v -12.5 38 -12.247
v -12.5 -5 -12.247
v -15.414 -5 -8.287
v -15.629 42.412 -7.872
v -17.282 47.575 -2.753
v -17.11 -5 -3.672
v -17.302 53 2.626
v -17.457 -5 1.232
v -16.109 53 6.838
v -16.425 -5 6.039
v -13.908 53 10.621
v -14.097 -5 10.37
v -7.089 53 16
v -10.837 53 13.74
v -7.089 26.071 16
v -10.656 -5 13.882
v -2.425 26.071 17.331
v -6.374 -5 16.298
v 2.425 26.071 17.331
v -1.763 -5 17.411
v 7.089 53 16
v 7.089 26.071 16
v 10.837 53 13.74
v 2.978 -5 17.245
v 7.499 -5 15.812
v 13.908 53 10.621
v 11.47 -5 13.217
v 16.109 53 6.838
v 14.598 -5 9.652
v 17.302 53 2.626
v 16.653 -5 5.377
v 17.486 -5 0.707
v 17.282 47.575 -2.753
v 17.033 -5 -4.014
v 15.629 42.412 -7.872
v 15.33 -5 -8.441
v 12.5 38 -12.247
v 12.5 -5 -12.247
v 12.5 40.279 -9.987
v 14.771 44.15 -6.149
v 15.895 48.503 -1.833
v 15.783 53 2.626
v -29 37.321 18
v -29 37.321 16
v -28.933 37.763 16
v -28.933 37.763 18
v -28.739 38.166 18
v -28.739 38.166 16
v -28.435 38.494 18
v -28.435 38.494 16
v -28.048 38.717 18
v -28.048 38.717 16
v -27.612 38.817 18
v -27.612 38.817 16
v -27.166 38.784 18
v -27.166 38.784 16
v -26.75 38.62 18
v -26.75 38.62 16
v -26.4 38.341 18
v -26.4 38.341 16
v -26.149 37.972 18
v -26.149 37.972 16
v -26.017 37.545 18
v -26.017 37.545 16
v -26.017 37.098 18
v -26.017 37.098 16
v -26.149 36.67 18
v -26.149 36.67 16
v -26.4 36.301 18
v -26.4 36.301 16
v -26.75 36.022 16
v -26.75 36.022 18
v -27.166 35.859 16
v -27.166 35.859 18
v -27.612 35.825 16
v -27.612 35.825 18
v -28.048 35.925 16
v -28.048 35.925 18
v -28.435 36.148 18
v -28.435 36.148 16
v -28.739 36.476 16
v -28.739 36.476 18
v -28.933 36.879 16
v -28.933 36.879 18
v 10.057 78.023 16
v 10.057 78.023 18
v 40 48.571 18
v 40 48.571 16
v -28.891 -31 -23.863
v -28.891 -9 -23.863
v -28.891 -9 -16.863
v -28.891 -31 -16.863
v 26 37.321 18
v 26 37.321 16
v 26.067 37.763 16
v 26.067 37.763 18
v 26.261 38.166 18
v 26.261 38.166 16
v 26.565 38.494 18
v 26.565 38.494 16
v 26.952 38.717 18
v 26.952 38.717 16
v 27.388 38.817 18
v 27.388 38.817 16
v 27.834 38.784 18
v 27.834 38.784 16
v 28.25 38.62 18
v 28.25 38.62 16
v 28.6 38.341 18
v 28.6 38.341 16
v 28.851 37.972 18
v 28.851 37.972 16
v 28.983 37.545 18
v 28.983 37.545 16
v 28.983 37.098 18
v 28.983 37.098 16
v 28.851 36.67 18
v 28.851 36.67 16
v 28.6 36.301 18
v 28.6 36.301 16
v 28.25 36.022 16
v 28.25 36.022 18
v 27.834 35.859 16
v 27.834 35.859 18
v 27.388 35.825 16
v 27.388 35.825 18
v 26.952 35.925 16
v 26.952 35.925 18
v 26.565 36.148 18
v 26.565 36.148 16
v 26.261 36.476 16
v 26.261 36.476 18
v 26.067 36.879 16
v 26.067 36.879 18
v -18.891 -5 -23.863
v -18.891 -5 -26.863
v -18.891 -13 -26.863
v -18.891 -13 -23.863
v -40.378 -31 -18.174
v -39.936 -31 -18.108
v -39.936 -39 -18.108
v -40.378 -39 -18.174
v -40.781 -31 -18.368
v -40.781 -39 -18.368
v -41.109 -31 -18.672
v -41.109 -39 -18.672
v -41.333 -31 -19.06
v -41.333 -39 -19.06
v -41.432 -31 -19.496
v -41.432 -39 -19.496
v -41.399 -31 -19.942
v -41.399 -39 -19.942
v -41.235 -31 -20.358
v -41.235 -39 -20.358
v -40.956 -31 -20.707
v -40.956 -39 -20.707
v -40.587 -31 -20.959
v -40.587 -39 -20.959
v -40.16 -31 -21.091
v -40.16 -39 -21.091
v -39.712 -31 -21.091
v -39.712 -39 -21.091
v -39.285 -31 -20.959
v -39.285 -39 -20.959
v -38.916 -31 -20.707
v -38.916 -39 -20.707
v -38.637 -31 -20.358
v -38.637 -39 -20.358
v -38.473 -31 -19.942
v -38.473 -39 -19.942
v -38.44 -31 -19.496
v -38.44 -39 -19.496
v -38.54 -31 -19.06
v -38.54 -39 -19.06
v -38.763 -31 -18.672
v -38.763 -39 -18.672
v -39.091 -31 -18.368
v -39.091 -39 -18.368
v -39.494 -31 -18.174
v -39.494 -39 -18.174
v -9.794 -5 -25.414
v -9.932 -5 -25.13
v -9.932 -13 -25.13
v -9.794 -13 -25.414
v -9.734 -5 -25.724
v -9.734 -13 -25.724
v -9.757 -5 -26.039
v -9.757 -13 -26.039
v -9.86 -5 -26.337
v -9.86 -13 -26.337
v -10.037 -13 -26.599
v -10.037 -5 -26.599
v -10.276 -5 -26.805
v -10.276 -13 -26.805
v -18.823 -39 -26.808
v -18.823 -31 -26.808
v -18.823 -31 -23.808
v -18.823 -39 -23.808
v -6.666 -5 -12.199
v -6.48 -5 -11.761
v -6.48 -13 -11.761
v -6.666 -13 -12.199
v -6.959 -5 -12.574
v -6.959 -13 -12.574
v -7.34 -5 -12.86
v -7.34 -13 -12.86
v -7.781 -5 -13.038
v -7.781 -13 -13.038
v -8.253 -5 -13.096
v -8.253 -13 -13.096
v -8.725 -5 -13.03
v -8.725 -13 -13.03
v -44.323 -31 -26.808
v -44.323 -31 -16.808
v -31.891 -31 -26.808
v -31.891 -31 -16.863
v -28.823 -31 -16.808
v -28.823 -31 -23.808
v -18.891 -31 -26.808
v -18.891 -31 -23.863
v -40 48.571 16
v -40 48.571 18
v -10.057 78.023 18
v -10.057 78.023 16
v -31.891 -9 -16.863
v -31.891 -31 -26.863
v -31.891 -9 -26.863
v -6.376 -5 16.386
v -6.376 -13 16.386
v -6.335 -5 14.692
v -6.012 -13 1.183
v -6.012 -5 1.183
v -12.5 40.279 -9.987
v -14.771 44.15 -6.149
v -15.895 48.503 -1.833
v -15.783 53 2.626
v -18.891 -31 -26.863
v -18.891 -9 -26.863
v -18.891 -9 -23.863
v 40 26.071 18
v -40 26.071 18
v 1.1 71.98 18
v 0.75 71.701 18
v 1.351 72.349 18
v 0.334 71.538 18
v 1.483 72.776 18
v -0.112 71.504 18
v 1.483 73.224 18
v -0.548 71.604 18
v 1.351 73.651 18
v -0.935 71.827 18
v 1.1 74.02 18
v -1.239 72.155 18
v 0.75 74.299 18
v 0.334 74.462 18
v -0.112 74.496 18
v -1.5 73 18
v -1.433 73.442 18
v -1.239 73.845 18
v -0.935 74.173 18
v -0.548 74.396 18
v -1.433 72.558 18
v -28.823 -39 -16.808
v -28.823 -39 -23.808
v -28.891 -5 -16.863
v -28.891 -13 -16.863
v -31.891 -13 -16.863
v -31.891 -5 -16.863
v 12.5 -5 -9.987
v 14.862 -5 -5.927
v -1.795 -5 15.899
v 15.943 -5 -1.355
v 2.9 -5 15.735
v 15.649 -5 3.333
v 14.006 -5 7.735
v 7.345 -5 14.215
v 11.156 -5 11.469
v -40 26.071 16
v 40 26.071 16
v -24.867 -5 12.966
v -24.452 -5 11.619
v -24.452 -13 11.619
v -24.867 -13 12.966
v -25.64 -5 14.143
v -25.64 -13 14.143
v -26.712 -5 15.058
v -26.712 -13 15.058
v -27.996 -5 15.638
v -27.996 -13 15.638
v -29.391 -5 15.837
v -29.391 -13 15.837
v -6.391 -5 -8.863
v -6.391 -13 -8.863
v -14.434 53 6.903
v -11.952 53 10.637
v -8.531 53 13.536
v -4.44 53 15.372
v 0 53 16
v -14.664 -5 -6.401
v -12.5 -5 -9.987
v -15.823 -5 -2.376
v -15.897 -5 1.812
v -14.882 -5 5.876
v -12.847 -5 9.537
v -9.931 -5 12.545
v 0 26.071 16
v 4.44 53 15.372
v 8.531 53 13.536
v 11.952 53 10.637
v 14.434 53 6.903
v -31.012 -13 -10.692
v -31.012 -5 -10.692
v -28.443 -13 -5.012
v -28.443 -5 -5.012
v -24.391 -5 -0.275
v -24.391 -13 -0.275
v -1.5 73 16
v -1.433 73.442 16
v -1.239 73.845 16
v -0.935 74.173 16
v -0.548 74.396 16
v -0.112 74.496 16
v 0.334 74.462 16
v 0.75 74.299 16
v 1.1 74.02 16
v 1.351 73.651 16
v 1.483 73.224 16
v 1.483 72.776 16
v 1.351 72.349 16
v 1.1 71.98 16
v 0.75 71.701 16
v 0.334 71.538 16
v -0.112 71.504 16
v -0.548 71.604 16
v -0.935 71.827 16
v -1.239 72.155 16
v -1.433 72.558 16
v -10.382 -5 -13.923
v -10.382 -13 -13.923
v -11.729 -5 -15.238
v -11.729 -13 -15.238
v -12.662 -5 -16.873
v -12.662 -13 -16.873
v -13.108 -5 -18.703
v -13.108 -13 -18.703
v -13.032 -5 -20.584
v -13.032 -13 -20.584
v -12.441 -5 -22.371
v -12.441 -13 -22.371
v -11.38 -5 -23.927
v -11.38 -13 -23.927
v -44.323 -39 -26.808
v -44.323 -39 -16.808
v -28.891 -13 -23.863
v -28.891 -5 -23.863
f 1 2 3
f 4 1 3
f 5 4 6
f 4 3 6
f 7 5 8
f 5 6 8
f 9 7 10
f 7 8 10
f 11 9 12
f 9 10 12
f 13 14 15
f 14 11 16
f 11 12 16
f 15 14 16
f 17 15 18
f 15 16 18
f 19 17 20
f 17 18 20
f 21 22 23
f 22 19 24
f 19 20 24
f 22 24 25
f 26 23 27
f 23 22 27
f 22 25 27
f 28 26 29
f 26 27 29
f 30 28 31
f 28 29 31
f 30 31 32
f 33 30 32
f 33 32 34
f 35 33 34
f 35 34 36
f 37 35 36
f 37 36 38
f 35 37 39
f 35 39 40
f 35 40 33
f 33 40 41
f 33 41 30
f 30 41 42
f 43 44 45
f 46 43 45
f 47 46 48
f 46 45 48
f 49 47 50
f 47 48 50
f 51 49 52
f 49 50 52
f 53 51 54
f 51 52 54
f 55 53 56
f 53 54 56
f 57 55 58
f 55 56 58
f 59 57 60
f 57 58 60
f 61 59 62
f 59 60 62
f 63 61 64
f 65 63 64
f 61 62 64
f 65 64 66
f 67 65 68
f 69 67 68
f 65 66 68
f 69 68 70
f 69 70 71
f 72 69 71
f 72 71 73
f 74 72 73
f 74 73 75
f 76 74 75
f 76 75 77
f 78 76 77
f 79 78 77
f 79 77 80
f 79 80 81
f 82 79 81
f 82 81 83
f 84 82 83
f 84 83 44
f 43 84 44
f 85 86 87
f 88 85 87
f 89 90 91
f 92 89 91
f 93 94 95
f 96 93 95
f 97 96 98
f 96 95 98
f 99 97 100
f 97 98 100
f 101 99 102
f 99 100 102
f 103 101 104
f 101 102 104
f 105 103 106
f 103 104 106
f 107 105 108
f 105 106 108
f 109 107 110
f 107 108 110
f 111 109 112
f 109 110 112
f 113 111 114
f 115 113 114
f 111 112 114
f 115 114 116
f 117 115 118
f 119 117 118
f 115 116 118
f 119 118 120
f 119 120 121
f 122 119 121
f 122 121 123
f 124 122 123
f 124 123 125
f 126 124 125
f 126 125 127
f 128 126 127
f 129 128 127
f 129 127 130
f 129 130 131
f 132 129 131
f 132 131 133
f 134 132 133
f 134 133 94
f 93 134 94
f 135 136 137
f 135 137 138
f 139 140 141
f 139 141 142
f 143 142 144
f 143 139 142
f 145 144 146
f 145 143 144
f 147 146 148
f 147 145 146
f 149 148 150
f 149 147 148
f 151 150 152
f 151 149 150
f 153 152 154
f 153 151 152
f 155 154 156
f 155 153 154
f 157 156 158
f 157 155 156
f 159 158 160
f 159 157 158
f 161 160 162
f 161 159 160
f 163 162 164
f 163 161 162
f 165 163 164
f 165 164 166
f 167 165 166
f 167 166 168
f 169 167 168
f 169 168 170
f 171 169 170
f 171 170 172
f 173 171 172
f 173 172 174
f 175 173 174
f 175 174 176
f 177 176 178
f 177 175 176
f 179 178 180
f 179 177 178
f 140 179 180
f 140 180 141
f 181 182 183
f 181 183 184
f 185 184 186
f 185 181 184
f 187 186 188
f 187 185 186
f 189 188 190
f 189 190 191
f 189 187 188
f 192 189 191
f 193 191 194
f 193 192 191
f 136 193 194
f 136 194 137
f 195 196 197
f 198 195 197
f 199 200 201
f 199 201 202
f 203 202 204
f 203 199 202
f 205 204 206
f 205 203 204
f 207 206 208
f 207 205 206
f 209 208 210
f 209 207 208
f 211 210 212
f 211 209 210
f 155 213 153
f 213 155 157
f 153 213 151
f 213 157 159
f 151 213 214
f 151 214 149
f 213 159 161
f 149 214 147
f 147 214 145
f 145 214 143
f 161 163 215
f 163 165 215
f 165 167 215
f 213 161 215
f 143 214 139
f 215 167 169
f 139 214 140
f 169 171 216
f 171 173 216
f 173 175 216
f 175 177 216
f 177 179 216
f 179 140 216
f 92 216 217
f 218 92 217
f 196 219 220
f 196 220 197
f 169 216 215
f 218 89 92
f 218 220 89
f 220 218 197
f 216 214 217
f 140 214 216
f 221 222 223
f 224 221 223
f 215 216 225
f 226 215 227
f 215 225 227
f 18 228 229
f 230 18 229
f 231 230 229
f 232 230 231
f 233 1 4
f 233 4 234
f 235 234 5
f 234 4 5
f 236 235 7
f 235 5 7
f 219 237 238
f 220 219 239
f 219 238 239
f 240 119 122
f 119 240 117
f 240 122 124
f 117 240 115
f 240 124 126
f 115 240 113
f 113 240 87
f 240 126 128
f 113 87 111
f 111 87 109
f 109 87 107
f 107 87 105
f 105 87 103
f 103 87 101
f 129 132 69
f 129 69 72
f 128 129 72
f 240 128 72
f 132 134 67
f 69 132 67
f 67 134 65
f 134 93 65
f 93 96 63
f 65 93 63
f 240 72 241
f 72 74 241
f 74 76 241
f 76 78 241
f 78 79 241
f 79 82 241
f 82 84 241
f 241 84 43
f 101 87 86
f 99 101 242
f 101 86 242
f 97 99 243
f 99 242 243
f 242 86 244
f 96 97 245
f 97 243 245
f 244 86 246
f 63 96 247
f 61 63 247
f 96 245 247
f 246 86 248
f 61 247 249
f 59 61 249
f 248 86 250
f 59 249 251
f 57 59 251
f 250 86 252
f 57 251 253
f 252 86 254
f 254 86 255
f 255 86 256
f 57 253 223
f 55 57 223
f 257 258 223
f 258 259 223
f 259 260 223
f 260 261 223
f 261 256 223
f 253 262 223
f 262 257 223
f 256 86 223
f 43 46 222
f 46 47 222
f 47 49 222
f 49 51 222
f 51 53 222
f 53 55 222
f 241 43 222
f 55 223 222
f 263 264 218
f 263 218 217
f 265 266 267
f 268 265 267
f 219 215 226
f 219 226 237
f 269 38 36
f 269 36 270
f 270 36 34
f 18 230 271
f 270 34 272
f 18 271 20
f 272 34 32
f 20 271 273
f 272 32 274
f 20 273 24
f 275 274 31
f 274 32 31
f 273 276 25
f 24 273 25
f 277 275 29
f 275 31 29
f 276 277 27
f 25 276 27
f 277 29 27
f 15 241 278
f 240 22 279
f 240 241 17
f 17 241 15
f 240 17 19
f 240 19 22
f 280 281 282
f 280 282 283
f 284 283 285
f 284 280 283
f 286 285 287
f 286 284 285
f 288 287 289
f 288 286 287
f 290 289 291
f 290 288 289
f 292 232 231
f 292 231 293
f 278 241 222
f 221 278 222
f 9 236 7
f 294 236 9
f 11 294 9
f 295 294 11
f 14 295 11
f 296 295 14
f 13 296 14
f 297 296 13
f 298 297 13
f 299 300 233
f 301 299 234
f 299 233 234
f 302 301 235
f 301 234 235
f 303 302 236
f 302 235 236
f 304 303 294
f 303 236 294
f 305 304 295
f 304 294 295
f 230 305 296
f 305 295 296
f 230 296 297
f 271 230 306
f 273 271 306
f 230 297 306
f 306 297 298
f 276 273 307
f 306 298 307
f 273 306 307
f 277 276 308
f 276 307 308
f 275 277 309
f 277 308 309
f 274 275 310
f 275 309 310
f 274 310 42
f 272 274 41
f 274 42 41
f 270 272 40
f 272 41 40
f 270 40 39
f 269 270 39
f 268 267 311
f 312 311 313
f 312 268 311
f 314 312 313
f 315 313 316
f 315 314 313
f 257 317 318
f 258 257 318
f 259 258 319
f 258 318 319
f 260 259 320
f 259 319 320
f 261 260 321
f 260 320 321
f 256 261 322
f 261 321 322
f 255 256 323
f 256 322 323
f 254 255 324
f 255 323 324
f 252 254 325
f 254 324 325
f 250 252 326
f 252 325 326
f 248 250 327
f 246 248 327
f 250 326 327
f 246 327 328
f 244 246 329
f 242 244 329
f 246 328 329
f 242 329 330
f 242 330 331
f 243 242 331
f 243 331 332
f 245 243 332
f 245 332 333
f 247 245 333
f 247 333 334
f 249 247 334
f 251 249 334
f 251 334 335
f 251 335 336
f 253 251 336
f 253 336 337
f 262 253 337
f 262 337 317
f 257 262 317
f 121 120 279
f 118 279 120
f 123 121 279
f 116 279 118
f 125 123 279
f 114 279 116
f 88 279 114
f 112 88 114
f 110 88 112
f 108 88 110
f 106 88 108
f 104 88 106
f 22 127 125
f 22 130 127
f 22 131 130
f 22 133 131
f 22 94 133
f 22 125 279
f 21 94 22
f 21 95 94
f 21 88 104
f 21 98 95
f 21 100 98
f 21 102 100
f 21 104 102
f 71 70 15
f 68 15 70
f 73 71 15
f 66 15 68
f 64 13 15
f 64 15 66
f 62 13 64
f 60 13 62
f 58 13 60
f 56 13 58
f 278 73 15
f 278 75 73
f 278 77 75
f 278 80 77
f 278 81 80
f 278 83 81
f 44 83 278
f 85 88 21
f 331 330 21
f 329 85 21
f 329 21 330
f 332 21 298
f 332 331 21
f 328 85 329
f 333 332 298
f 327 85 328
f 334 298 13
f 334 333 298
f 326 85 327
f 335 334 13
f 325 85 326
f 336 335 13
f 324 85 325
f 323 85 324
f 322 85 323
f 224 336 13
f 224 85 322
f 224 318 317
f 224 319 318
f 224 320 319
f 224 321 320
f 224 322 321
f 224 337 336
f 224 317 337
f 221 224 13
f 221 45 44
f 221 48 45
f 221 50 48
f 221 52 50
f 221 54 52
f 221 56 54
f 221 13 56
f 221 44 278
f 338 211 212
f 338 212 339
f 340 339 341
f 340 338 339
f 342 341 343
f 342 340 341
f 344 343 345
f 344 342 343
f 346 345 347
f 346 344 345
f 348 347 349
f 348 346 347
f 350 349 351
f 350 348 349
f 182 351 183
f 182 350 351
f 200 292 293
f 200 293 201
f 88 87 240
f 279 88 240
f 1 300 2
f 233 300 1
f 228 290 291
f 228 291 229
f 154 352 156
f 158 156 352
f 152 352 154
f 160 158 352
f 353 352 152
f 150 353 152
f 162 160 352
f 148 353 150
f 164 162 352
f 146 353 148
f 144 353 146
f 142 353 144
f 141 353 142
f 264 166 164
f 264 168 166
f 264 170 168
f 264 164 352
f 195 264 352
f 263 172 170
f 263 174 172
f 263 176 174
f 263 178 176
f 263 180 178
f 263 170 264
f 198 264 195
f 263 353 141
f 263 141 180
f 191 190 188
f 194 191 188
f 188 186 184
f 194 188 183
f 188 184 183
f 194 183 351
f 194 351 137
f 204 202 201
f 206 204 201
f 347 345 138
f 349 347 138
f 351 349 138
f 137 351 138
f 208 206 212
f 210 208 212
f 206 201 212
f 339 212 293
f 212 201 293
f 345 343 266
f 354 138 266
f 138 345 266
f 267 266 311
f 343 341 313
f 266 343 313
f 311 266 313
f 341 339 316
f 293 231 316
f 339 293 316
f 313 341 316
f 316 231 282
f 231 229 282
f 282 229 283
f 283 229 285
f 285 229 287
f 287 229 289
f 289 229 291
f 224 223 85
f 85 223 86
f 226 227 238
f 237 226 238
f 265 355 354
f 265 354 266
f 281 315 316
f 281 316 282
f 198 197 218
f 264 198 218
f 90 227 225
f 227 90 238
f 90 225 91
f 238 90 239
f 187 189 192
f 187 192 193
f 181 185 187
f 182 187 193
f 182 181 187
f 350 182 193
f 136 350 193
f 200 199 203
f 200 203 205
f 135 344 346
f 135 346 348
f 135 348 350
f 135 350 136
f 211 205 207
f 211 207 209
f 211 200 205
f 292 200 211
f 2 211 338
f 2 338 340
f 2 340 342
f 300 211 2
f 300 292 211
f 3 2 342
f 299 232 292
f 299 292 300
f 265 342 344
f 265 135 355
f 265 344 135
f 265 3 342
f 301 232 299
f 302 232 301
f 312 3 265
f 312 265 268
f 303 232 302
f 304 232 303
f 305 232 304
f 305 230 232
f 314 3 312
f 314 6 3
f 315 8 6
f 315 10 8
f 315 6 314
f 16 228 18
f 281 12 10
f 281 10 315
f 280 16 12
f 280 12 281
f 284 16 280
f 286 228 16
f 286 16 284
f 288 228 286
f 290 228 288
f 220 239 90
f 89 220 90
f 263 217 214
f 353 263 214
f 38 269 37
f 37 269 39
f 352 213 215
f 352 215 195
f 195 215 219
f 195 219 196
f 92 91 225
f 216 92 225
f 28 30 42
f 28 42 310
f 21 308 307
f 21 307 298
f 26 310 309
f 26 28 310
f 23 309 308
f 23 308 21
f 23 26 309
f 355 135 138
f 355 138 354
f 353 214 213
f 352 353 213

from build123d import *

# Parameters (mm, degrees)
BOSS_EXTRUDE1_DEPTH      = 53
BOSS_EXTRUDE1_DEPTH_BACK = 5
SKETCH1_R                = 17.5
SKETCH2_R                = 16
CUT_EXTRUDE1_DEPTH       = 108
SKETCH3_W                = 25
SKETCH3_H                = 20
CUT_EXTRUDE2_DEPTH       = 108
CUT_EXTRUDE3_DEPTH       = 108
CUT_EXTRUDE3_DEPTH_BACK  = 108
BOSS_EXTRUDE2_DEPTH      = 2
SKETCH10_R               = 1.5
CUT_EXTRUDE4_DEPTH       = 16
BOSS_EXTRUDE3_DEPTH      = 8
BOSS_EXTRUDE5_DEPTH      = 18
BOSS_EXTRUDE5_DEPTH_BACK = 4
SKETCH13_R               = 1.500172947
BOSS_EXTRUDE6_DEPTH      = 8


with BuildPart() as part:
    # Sketch1 → Boss-Extrude1 (new, two sides: drawn at the far end of the back side and taken through both)
    with BuildSketch(Plane(origin=(0, 0, 0), x_dir=(1, 0, 0), z_dir=(0, 1, 0)).offset(-BOSS_EXTRUDE1_DEPTH_BACK)):
        with Locations(Location((0, 0, 0), (0, 0, 270))):
            Circle(SKETCH1_R)
    extrude(amount=BOSS_EXTRUDE1_DEPTH + BOSS_EXTRUDE1_DEPTH_BACK)

    # Sketch2 → Cut-Extrude1 (cut)
    with BuildSketch(Plane(origin=(0, 53, 0), x_dir=(1, 0, 0), z_dir=(0, 1, 0))):
        with Locations(Location((0, 0, 0), (0, 0, 270))):
            Circle(SKETCH2_R)
    extrude(amount=-CUT_EXTRUDE1_DEPTH, mode=Mode.SUBTRACT)

    # Sketch3 → Cut-Extrude2 (cut)
    with BuildSketch(Plane(origin=(0, 53, 0), x_dir=(1, 0, 0), z_dir=(0, 1, 0))):
        with Locations((0, 16)):
            Rectangle(SKETCH3_W, SKETCH3_H)
    extrude(amount=-CUT_EXTRUDE2_DEPTH, mode=Mode.SUBTRACT)

    # Sketch7 → Cut-Extrude3 (cut, two sides: drawn at the far end of the back side and taken through both)
    with BuildSketch(Plane(origin=(0, 0, 0), x_dir=(0, 0, -1), z_dir=(1, 0, 0)).offset(-CUT_EXTRUDE3_DEPTH_BACK)):
        Polygon((12.247448714, 53), (12.247448714, 38), (-2.626275643, 53), align=None)
    extrude(amount=CUT_EXTRUDE3_DEPTH + CUT_EXTRUDE3_DEPTH_BACK, mode=Mode.SUBTRACT)

    # Sketch8 → Boss-Extrude2 (add)
    with BuildSketch(Plane.XY.offset(18)):
        Polygon((10.05709572, 78.023156751), (40, 48.571119754), (40, 26.071119754), (0, 26.071119754), (-40, 26.071119754), (-40, 48.571119754), (-10.05709572, 78.023156751), align=None)
    extrude(amount=-BOSS_EXTRUDE2_DEPTH)

    # Sketch10 → Cut-Extrude4 (cut)
    with BuildSketch(Plane(origin=(0, 0, 16), x_dir=(-1, 0, 0), z_dir=(0, 0, -1))):
        with Locations((-27.5, 37.321119754)):
            Circle(SKETCH10_R)
        with Locations((27.5, 37.321119754)):
            Circle(SKETCH10_R)
        with Locations((0, 73)):
            Circle(SKETCH10_R)
    extrude(amount=-CUT_EXTRUDE4_DEPTH, mode=Mode.SUBTRACT)

    # Sketch11 → Boss-Extrude3 (add)
    with BuildSketch(Plane.XZ.offset(5)):
        with BuildLine():
            Line((-6.390882144, -8.863379027), (-6.480237612, -11.760990645))
            ThreePointArc((-6.480237612, -11.760990645), (-7.33967567, -12.860163004), (-8.724622378, -13.029680754))
            ThreePointArc((-8.724622378, -13.029680754), (-13.107641391, -18.70255332), (-9.931897769, -25.129604841))
            ThreePointArc((-9.931897769, -25.129604841), (-9.756819698, -26.038761874), (-10.275891909, -26.805431868))
            Line((-10.275891909, -26.805431868), (-18.890882144, -26.863380934))
            Line((-18.890882144, -26.863380934), (-18.890882144, -23.863377119))
            Line((-18.890882144, -23.863377119), (-28.890882144, -23.863377119))
            Line((-28.890882144, -23.863377119), (-28.890882144, -16.863377119))
            Line((-28.890882144, -16.863377119), (-31.890882144, -16.863377119))
            ThreePointArc((-31.890882144, -16.863377119), (-29.928759086, -7.76088478), (-24.390882144, -0.275084044))
            Line((-24.390882144, -0.275084044), (-24.452405581, 11.618795847))
            ThreePointArc((-24.452405581, 11.618795847), (-26.143620347, 14.638664645), (-29.390882144, 15.836623644))
            Line((-29.390882144, 15.836623644), (-6.375618396, 16.386397999))
            Line((-6.375618396, 16.386397999), (-6.012446141, 1.182878311))
            Line((-6.012446141, 1.182878311), (-6.390882144, -8.863379027))
        make_face()
    extrude(amount=BOSS_EXTRUDE3_DEPTH)


with BuildPart() as body_2:
    # Sketch12 → Boss-Extrude5 (new, two sides: drawn at the far end of the back side and taken through both)
    with BuildSketch(Plane.XZ.offset(13).offset(-BOSS_EXTRUDE5_DEPTH_BACK)):
        Polygon((-31.890882144, -26.863380934), (-18.890882144, -26.863380934), (-18.890882144, -23.863377119), (-28.890882144, -23.863377119), (-28.890882144, -16.863377119), (-31.890882144, -16.863377119), align=None)
    extrude(amount=BOSS_EXTRUDE5_DEPTH + BOSS_EXTRUDE5_DEPTH_BACK)

    # Sketch13 → Boss-Extrude6 (add)
    with BuildSketch(Plane.XZ.offset(31)):
        Polygon((-44.322698898, -26.807587047), (-18.822698898, -26.807587047), (-18.822698898, -23.807583233), (-28.822698898, -23.807583233), (-28.822698898, -16.807583233), (-44.322698898, -16.807583233), align=None)
        with Locations(Location((-39.936045011, -19.607691517, 0), (0, 0, 90))):
            Circle(SKETCH13_R, mode=Mode.SUBTRACT)
    extrude(amount=BOSS_EXTRUDE6_DEPTH)


solid = Compound([part.part, body_2.part])
